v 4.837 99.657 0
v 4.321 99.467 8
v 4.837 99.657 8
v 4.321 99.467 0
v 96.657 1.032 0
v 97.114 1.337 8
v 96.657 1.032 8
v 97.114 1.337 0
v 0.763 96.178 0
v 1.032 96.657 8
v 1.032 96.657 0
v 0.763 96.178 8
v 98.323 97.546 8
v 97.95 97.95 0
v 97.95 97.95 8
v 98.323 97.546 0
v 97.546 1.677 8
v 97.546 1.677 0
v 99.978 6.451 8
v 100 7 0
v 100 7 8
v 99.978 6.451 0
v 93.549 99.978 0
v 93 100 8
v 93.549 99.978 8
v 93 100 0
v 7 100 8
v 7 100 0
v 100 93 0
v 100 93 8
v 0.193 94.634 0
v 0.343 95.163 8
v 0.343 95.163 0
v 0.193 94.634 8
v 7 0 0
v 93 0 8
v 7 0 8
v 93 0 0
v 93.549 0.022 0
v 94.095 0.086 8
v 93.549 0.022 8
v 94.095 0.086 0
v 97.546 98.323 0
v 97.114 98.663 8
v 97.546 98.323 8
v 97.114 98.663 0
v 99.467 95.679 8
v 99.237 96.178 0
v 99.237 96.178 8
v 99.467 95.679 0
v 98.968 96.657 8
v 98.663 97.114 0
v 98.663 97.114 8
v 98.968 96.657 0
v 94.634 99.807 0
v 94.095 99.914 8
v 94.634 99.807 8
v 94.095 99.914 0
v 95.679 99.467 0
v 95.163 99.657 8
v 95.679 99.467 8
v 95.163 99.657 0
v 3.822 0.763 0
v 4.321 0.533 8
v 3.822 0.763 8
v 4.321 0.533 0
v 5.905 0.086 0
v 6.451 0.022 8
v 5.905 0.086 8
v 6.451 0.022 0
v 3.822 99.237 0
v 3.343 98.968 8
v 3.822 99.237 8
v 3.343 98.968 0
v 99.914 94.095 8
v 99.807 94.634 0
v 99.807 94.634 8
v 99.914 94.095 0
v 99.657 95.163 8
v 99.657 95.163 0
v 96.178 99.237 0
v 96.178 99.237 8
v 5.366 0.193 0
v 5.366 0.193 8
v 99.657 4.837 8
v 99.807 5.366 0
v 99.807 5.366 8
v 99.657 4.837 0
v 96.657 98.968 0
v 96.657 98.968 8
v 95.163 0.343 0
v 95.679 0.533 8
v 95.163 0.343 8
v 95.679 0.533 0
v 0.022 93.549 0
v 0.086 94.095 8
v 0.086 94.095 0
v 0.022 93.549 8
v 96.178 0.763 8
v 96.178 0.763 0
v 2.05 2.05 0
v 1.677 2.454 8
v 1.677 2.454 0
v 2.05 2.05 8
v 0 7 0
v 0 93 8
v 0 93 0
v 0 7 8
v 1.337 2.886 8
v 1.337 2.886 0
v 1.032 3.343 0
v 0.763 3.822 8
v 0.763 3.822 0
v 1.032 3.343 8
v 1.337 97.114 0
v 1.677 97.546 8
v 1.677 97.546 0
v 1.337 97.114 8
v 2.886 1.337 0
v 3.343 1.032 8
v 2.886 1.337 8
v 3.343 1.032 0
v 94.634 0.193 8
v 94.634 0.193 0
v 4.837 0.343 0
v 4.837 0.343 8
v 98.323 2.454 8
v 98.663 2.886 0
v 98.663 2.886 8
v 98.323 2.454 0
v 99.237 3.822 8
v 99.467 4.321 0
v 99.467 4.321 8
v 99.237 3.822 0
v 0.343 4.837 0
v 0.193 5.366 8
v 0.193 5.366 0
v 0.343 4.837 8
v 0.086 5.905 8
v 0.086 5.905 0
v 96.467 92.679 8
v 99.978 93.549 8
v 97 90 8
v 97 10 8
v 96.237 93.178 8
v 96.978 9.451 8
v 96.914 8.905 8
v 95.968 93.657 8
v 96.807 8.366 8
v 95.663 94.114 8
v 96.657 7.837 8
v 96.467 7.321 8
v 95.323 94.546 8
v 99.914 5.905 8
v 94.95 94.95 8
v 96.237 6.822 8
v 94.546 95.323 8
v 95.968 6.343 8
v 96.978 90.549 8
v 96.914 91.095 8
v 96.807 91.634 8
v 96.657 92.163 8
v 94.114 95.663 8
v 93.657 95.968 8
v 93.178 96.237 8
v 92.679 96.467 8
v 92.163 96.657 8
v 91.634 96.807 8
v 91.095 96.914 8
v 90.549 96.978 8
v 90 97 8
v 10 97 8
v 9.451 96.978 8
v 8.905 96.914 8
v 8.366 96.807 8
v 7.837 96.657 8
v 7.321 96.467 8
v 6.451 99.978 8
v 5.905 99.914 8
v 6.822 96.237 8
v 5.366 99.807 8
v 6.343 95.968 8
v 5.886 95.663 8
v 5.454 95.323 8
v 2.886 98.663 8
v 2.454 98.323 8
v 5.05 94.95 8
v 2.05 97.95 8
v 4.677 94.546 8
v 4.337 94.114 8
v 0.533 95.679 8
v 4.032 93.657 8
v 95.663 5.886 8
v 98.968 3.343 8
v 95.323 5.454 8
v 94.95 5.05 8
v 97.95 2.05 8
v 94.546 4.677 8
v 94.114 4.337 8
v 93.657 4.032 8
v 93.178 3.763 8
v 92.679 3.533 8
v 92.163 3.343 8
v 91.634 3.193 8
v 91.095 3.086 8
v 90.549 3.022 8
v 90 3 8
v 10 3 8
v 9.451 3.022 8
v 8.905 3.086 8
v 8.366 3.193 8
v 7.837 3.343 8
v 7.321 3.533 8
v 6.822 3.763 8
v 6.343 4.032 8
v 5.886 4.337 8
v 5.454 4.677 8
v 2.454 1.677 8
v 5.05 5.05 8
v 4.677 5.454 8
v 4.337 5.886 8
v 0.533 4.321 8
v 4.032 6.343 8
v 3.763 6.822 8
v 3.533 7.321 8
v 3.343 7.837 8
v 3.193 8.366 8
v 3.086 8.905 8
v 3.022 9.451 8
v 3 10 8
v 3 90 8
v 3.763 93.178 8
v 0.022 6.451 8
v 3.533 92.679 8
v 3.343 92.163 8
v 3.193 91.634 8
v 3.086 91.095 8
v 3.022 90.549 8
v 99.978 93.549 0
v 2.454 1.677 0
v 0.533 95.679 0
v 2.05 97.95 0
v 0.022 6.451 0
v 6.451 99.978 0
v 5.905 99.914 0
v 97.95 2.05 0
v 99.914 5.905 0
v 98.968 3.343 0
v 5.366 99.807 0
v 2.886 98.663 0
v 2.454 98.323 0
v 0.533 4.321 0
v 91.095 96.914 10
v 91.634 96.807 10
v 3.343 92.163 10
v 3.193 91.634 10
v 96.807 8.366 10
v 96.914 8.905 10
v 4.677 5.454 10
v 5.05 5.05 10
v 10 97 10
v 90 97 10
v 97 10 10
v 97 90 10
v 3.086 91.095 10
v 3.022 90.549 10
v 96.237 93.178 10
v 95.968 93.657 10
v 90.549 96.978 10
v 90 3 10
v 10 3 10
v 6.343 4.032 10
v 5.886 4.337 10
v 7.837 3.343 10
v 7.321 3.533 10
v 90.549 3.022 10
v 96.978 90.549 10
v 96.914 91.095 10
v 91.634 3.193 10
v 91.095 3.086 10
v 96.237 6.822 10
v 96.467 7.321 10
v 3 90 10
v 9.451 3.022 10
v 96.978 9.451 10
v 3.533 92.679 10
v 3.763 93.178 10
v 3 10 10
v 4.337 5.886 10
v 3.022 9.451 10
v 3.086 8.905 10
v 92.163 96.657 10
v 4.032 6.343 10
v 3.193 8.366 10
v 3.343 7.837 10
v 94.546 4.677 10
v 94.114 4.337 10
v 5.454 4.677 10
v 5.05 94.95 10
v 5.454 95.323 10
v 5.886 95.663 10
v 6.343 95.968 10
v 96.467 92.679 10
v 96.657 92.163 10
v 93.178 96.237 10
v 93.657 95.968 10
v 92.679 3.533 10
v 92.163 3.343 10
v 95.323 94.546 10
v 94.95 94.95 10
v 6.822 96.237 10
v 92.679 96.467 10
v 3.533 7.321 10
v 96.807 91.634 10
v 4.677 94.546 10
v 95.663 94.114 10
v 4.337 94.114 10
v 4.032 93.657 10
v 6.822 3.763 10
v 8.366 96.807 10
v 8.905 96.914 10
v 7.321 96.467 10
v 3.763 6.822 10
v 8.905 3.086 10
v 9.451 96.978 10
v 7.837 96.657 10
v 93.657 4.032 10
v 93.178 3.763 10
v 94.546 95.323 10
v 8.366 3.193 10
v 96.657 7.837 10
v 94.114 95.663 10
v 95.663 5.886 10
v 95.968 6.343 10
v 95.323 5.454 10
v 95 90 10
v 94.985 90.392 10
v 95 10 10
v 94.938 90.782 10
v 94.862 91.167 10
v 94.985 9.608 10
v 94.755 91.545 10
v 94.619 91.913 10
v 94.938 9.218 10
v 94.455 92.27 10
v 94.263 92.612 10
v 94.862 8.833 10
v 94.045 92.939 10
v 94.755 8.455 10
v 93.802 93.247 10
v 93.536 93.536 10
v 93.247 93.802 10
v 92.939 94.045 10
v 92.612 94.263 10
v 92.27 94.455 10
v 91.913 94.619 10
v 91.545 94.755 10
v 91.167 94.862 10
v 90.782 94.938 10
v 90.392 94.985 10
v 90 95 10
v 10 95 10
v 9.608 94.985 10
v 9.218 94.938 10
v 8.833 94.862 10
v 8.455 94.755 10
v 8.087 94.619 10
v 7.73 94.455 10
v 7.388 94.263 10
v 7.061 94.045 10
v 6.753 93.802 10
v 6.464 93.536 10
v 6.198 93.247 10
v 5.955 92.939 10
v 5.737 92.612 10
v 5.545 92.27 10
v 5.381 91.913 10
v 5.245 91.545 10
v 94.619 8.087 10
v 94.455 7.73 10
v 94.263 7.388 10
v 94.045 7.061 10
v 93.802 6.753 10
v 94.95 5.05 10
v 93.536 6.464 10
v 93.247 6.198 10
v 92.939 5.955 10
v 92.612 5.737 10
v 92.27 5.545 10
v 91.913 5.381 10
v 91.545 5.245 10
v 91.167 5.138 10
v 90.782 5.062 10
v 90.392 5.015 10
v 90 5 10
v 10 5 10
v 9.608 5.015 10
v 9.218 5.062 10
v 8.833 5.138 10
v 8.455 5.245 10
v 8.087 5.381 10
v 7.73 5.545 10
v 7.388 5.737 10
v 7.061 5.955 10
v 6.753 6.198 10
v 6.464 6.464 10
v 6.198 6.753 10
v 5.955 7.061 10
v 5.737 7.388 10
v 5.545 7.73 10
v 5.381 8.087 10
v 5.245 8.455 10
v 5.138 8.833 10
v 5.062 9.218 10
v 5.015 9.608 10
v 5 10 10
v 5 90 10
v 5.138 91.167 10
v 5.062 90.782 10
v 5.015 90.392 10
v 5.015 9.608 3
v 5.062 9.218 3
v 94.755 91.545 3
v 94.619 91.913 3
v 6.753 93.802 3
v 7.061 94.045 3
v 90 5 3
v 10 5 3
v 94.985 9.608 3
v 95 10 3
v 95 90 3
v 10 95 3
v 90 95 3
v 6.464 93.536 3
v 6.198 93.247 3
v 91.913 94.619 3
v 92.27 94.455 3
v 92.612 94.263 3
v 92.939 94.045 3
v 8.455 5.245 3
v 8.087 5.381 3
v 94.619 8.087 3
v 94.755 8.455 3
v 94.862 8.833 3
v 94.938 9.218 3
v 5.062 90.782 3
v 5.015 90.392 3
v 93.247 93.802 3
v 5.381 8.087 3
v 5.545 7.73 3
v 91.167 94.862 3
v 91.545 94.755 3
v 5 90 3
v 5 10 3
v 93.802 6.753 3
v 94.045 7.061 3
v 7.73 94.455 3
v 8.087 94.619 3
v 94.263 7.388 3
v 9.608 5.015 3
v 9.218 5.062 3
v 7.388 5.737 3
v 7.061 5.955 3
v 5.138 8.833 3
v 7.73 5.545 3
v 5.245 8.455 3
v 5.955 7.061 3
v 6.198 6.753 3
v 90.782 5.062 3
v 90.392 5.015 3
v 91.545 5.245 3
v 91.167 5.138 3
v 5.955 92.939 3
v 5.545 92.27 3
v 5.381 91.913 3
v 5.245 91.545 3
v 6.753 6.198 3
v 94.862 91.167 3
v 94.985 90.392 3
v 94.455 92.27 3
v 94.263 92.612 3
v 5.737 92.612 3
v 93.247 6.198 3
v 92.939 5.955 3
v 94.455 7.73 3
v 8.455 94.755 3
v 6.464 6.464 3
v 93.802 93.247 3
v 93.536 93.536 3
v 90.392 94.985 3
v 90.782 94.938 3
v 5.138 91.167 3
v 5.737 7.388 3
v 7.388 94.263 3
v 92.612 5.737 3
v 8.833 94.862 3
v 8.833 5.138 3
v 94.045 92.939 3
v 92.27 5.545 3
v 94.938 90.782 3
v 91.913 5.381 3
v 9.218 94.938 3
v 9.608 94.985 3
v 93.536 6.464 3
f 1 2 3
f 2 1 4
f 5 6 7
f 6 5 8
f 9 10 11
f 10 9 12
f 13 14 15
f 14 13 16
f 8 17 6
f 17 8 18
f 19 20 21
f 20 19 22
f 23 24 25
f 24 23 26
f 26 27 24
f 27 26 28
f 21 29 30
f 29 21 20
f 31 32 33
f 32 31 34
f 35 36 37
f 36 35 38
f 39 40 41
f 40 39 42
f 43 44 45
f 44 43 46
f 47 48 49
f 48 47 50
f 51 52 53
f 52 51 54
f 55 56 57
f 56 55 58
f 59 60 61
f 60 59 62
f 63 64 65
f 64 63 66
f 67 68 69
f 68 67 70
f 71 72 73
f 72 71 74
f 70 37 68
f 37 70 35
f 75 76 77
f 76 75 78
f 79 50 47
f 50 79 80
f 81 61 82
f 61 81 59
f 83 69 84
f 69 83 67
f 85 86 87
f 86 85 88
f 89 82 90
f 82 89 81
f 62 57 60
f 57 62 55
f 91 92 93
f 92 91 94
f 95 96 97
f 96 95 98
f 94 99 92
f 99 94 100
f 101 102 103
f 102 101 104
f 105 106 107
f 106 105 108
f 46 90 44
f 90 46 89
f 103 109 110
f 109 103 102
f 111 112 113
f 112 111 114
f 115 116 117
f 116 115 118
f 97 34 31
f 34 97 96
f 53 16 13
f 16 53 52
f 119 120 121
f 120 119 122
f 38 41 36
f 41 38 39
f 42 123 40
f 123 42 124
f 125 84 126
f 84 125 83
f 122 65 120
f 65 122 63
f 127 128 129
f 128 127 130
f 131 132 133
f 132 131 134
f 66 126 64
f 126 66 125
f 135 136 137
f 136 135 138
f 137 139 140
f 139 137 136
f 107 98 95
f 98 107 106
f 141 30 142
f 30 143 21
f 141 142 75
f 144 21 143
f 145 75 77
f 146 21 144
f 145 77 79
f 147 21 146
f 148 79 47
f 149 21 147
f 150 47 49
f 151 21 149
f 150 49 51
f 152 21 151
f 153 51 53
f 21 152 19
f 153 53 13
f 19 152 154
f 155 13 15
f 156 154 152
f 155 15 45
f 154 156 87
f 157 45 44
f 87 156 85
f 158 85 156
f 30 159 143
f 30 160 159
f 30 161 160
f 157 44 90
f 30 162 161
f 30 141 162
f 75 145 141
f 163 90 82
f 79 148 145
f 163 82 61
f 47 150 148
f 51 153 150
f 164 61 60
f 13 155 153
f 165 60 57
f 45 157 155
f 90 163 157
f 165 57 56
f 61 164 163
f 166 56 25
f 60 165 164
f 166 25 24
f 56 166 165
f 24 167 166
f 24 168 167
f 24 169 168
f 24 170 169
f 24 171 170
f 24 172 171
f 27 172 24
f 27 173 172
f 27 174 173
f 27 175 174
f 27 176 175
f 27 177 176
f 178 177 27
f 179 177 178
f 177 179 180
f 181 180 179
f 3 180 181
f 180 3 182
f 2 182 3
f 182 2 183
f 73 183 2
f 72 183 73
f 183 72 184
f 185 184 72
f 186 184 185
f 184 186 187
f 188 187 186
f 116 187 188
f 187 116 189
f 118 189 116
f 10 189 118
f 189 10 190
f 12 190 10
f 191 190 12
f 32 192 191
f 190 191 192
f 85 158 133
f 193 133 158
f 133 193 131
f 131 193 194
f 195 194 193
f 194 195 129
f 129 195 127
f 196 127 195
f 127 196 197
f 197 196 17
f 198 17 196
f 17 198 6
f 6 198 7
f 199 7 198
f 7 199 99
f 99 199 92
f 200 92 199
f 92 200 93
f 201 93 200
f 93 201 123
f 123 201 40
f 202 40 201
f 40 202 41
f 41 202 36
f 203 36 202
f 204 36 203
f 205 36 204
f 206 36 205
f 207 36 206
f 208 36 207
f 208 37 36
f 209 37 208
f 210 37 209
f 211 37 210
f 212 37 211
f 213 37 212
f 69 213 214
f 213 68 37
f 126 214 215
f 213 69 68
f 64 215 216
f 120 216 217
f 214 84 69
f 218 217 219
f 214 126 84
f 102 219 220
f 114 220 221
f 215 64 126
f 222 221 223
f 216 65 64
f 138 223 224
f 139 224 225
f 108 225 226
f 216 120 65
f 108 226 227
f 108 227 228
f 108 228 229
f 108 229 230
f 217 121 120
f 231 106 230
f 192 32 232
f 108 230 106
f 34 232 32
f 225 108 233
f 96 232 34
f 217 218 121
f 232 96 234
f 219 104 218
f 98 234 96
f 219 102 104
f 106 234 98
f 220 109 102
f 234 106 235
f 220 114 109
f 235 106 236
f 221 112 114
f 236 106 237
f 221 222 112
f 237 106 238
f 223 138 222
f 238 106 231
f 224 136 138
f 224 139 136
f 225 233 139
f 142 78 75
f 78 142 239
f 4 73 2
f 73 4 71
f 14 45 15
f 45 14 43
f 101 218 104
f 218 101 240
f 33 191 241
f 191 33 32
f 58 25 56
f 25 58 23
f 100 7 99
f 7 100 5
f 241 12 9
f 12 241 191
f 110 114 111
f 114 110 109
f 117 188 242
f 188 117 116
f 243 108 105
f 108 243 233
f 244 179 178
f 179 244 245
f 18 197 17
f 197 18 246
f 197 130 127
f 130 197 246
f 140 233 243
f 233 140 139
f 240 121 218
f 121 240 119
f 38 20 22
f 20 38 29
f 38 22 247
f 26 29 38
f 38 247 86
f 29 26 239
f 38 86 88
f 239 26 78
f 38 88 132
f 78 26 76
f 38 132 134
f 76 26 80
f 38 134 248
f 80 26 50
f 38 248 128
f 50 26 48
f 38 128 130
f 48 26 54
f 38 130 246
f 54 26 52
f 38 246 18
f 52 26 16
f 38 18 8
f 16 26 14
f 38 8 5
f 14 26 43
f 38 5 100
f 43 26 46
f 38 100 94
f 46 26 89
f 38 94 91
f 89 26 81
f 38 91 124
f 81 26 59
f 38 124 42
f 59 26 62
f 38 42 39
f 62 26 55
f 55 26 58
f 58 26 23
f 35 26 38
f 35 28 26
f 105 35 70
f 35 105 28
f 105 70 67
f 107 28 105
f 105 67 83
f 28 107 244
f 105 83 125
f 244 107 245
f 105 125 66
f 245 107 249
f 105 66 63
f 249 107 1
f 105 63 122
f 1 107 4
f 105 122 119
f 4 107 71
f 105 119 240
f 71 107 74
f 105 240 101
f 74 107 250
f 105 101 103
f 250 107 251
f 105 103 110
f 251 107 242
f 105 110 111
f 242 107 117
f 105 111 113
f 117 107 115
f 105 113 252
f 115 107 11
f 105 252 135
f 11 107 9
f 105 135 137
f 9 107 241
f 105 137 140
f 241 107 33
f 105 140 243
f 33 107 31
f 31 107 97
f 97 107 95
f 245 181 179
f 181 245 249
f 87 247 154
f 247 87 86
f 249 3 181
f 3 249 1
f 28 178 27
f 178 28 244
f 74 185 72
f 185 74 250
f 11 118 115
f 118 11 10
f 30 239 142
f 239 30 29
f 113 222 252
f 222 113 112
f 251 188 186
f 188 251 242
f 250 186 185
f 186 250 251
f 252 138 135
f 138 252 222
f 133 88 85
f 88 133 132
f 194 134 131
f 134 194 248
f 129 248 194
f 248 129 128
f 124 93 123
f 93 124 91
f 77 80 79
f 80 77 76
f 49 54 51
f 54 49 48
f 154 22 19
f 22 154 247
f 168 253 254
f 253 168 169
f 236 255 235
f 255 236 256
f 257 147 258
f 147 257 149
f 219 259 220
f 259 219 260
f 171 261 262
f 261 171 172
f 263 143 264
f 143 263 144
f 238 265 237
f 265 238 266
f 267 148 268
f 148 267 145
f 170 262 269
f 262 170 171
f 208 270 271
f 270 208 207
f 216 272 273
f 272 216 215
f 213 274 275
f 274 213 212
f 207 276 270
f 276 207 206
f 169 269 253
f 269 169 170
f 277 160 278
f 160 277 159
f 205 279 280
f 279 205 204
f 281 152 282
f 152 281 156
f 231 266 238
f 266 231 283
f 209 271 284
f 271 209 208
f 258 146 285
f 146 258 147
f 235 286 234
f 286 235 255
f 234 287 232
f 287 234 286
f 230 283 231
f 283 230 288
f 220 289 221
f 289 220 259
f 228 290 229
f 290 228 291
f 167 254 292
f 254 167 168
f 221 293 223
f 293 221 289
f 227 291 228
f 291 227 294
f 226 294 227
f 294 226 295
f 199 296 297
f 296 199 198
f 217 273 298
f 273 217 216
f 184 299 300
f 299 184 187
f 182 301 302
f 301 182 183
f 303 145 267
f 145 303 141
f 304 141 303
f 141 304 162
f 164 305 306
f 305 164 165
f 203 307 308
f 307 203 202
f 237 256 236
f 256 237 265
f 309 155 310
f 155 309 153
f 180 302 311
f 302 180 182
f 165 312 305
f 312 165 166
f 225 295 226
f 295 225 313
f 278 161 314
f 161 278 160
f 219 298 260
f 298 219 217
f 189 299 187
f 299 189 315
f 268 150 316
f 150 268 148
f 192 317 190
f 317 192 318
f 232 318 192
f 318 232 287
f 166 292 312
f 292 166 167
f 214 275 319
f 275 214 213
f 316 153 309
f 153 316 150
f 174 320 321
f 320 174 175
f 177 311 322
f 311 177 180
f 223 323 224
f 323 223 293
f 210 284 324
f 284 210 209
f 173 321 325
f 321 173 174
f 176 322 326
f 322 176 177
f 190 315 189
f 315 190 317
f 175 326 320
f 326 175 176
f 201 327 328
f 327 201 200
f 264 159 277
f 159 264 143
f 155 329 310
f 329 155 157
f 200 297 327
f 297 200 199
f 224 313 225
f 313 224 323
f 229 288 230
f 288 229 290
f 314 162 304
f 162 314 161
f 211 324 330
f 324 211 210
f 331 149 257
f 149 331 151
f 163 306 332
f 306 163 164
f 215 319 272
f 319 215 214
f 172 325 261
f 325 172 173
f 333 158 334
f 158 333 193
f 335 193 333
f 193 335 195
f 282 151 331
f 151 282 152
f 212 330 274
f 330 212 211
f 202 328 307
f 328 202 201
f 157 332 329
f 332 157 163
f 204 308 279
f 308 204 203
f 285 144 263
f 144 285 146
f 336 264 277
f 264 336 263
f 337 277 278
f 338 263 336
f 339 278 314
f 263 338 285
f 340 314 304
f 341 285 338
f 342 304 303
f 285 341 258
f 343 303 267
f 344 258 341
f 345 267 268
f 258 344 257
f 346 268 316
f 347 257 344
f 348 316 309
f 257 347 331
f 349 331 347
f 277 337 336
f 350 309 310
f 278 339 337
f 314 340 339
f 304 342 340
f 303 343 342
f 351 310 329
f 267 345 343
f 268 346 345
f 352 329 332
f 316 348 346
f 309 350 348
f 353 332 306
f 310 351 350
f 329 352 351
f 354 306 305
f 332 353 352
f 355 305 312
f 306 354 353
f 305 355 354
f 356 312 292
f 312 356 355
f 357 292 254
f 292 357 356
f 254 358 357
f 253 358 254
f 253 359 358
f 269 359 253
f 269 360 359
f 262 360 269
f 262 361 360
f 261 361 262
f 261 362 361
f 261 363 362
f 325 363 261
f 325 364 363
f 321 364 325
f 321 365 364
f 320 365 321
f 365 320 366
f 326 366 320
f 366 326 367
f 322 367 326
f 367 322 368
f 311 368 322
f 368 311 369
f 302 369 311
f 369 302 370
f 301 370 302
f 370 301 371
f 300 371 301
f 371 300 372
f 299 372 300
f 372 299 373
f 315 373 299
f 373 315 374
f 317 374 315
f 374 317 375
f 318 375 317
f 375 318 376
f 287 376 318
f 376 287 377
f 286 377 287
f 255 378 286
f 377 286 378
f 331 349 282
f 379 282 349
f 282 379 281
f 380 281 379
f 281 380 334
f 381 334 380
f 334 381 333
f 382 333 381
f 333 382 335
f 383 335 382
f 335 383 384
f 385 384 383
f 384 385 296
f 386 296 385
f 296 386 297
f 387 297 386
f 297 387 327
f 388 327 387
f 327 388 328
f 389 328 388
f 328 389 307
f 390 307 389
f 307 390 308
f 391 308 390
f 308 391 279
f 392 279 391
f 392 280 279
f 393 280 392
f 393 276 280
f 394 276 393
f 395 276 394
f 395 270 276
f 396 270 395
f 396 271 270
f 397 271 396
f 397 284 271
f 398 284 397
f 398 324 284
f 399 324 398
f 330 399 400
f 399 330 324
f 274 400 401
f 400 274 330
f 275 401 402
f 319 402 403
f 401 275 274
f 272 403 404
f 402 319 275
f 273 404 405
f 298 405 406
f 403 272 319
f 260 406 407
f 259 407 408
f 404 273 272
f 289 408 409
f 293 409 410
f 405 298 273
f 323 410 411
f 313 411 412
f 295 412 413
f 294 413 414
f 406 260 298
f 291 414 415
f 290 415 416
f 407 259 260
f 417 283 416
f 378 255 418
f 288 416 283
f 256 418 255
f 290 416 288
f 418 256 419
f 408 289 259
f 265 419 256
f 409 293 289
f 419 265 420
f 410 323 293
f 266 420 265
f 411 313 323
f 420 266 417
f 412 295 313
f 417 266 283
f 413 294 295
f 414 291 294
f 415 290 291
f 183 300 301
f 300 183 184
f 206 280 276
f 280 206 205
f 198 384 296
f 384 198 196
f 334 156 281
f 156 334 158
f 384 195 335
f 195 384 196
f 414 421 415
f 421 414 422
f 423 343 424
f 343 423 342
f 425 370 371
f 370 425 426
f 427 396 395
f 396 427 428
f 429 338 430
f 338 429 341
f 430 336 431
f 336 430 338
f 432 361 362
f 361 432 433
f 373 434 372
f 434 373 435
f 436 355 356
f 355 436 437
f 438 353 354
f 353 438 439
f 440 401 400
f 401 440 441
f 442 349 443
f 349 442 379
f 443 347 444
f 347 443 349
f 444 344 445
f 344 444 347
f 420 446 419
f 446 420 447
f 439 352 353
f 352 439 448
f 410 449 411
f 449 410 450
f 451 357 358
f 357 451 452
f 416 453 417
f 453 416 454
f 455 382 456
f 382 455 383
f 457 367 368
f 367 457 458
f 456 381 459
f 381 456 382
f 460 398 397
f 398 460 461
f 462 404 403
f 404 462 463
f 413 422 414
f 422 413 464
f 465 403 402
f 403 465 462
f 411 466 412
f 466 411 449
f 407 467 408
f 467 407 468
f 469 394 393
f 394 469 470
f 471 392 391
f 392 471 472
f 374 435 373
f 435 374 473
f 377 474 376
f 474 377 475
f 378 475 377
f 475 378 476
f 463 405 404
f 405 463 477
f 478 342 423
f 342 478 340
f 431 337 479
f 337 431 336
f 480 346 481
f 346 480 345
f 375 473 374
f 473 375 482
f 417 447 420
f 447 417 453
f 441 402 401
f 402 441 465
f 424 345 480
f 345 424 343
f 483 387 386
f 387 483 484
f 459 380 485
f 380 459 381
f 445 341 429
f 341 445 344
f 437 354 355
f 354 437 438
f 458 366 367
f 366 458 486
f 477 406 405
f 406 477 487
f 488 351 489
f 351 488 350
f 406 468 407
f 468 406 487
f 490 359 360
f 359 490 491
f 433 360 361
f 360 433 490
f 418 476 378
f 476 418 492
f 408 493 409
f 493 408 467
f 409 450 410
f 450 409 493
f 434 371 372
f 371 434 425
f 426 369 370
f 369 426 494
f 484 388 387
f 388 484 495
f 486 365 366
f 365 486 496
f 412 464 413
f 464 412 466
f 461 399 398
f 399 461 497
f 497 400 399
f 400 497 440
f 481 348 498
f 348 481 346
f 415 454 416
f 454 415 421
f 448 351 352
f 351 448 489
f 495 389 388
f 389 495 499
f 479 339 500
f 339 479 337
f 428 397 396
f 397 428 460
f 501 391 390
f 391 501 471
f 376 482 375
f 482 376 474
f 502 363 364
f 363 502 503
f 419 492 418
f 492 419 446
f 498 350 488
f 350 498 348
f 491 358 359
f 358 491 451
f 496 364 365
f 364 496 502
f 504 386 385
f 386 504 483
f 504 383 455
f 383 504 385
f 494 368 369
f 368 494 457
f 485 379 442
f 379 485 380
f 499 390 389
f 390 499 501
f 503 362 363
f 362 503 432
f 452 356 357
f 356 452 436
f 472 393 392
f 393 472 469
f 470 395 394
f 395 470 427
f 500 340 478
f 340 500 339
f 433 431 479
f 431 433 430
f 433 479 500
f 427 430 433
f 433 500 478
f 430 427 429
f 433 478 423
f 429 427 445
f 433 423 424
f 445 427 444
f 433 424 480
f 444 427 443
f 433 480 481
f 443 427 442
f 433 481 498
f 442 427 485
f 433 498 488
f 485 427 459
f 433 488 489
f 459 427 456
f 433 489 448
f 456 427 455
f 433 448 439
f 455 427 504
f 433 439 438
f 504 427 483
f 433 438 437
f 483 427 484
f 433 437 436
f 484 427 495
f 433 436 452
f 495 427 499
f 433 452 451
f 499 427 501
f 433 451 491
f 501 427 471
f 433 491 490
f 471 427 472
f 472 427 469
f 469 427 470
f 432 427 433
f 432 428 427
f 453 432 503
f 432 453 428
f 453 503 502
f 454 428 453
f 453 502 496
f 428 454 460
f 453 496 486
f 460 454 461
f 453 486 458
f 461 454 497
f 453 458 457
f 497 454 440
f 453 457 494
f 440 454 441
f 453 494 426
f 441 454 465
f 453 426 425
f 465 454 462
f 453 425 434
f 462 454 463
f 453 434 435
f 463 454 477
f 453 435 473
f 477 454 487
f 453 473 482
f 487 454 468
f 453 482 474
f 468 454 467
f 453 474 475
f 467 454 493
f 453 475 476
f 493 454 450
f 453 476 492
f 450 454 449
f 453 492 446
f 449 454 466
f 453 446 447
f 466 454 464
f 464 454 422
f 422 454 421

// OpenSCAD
// file: common.scad
// vim: ft=javascript

D = 1; // Small offset to avoid flush cuts
// $fa = 20;
// $fs = 0.1;
$fn = 80;

wells_x = 4;
wells_y = 4;
well_diameter = 16;
well_radius = well_diameter / 2;
well_margin = 6;

body_height = well_radius;
body_top_height = 2;
body_rim_width = 3;
body_padding = 9;
body_round_radius = 7;
body_length = 
  2 * body_padding + 
  wells_x * well_diameter + 
  (wells_x - 1) * well_margin;
body_width = 
  2 * body_padding + 
  wells_y * well_diameter + 
  (wells_y - 1) * well_margin;

lip_height = 3;


module rounded_box(size=[1, 1, 1], radius) {
  translate([radius, radius, 0]) {
    minkowski() {
      cube([size[0] - 2 * radius, size[1] - 2 * radius, size[2] - 1]);
      cylinder(h = 1, r = radius);
    }
  }
}

module body() {
    union() {
      // Body base
      rounded_box([ body_length, body_width, body_height ], body_round_radius);

      // Body top
      translate([ body_rim_width, body_rim_width, body_height - D ]) rounded_box([
        body_length - 2 * body_rim_width,
        body_width - 2 * body_rim_width,
        body_top_height + D
      ], body_round_radius);
    }
}

echo(str("### Length: ", body_length));
echo(str("### Width: ", body_width));
echo(str("### Height: ", body_height + body_top_height + lip_height));
// main file
// vim: ft=javascript

include <common.scad>;

wet_palette_offset = body_rim_width + 2;
wet_palette_body_length = body_length - 2 * wet_palette_offset;
wet_palette_body_width = body_width - 2 * wet_palette_offset;
wet_palette_corner_radius = 5;

module wet_palette_body() {
  difference() {
    body();

    translate([wet_palette_offset, wet_palette_offset, 3]) rounded_box([
      wet_palette_body_length,
      wet_palette_body_width,
      body_height + body_top_height
    ], wet_palette_corner_radius);
  };
}

wet_palette_body();
